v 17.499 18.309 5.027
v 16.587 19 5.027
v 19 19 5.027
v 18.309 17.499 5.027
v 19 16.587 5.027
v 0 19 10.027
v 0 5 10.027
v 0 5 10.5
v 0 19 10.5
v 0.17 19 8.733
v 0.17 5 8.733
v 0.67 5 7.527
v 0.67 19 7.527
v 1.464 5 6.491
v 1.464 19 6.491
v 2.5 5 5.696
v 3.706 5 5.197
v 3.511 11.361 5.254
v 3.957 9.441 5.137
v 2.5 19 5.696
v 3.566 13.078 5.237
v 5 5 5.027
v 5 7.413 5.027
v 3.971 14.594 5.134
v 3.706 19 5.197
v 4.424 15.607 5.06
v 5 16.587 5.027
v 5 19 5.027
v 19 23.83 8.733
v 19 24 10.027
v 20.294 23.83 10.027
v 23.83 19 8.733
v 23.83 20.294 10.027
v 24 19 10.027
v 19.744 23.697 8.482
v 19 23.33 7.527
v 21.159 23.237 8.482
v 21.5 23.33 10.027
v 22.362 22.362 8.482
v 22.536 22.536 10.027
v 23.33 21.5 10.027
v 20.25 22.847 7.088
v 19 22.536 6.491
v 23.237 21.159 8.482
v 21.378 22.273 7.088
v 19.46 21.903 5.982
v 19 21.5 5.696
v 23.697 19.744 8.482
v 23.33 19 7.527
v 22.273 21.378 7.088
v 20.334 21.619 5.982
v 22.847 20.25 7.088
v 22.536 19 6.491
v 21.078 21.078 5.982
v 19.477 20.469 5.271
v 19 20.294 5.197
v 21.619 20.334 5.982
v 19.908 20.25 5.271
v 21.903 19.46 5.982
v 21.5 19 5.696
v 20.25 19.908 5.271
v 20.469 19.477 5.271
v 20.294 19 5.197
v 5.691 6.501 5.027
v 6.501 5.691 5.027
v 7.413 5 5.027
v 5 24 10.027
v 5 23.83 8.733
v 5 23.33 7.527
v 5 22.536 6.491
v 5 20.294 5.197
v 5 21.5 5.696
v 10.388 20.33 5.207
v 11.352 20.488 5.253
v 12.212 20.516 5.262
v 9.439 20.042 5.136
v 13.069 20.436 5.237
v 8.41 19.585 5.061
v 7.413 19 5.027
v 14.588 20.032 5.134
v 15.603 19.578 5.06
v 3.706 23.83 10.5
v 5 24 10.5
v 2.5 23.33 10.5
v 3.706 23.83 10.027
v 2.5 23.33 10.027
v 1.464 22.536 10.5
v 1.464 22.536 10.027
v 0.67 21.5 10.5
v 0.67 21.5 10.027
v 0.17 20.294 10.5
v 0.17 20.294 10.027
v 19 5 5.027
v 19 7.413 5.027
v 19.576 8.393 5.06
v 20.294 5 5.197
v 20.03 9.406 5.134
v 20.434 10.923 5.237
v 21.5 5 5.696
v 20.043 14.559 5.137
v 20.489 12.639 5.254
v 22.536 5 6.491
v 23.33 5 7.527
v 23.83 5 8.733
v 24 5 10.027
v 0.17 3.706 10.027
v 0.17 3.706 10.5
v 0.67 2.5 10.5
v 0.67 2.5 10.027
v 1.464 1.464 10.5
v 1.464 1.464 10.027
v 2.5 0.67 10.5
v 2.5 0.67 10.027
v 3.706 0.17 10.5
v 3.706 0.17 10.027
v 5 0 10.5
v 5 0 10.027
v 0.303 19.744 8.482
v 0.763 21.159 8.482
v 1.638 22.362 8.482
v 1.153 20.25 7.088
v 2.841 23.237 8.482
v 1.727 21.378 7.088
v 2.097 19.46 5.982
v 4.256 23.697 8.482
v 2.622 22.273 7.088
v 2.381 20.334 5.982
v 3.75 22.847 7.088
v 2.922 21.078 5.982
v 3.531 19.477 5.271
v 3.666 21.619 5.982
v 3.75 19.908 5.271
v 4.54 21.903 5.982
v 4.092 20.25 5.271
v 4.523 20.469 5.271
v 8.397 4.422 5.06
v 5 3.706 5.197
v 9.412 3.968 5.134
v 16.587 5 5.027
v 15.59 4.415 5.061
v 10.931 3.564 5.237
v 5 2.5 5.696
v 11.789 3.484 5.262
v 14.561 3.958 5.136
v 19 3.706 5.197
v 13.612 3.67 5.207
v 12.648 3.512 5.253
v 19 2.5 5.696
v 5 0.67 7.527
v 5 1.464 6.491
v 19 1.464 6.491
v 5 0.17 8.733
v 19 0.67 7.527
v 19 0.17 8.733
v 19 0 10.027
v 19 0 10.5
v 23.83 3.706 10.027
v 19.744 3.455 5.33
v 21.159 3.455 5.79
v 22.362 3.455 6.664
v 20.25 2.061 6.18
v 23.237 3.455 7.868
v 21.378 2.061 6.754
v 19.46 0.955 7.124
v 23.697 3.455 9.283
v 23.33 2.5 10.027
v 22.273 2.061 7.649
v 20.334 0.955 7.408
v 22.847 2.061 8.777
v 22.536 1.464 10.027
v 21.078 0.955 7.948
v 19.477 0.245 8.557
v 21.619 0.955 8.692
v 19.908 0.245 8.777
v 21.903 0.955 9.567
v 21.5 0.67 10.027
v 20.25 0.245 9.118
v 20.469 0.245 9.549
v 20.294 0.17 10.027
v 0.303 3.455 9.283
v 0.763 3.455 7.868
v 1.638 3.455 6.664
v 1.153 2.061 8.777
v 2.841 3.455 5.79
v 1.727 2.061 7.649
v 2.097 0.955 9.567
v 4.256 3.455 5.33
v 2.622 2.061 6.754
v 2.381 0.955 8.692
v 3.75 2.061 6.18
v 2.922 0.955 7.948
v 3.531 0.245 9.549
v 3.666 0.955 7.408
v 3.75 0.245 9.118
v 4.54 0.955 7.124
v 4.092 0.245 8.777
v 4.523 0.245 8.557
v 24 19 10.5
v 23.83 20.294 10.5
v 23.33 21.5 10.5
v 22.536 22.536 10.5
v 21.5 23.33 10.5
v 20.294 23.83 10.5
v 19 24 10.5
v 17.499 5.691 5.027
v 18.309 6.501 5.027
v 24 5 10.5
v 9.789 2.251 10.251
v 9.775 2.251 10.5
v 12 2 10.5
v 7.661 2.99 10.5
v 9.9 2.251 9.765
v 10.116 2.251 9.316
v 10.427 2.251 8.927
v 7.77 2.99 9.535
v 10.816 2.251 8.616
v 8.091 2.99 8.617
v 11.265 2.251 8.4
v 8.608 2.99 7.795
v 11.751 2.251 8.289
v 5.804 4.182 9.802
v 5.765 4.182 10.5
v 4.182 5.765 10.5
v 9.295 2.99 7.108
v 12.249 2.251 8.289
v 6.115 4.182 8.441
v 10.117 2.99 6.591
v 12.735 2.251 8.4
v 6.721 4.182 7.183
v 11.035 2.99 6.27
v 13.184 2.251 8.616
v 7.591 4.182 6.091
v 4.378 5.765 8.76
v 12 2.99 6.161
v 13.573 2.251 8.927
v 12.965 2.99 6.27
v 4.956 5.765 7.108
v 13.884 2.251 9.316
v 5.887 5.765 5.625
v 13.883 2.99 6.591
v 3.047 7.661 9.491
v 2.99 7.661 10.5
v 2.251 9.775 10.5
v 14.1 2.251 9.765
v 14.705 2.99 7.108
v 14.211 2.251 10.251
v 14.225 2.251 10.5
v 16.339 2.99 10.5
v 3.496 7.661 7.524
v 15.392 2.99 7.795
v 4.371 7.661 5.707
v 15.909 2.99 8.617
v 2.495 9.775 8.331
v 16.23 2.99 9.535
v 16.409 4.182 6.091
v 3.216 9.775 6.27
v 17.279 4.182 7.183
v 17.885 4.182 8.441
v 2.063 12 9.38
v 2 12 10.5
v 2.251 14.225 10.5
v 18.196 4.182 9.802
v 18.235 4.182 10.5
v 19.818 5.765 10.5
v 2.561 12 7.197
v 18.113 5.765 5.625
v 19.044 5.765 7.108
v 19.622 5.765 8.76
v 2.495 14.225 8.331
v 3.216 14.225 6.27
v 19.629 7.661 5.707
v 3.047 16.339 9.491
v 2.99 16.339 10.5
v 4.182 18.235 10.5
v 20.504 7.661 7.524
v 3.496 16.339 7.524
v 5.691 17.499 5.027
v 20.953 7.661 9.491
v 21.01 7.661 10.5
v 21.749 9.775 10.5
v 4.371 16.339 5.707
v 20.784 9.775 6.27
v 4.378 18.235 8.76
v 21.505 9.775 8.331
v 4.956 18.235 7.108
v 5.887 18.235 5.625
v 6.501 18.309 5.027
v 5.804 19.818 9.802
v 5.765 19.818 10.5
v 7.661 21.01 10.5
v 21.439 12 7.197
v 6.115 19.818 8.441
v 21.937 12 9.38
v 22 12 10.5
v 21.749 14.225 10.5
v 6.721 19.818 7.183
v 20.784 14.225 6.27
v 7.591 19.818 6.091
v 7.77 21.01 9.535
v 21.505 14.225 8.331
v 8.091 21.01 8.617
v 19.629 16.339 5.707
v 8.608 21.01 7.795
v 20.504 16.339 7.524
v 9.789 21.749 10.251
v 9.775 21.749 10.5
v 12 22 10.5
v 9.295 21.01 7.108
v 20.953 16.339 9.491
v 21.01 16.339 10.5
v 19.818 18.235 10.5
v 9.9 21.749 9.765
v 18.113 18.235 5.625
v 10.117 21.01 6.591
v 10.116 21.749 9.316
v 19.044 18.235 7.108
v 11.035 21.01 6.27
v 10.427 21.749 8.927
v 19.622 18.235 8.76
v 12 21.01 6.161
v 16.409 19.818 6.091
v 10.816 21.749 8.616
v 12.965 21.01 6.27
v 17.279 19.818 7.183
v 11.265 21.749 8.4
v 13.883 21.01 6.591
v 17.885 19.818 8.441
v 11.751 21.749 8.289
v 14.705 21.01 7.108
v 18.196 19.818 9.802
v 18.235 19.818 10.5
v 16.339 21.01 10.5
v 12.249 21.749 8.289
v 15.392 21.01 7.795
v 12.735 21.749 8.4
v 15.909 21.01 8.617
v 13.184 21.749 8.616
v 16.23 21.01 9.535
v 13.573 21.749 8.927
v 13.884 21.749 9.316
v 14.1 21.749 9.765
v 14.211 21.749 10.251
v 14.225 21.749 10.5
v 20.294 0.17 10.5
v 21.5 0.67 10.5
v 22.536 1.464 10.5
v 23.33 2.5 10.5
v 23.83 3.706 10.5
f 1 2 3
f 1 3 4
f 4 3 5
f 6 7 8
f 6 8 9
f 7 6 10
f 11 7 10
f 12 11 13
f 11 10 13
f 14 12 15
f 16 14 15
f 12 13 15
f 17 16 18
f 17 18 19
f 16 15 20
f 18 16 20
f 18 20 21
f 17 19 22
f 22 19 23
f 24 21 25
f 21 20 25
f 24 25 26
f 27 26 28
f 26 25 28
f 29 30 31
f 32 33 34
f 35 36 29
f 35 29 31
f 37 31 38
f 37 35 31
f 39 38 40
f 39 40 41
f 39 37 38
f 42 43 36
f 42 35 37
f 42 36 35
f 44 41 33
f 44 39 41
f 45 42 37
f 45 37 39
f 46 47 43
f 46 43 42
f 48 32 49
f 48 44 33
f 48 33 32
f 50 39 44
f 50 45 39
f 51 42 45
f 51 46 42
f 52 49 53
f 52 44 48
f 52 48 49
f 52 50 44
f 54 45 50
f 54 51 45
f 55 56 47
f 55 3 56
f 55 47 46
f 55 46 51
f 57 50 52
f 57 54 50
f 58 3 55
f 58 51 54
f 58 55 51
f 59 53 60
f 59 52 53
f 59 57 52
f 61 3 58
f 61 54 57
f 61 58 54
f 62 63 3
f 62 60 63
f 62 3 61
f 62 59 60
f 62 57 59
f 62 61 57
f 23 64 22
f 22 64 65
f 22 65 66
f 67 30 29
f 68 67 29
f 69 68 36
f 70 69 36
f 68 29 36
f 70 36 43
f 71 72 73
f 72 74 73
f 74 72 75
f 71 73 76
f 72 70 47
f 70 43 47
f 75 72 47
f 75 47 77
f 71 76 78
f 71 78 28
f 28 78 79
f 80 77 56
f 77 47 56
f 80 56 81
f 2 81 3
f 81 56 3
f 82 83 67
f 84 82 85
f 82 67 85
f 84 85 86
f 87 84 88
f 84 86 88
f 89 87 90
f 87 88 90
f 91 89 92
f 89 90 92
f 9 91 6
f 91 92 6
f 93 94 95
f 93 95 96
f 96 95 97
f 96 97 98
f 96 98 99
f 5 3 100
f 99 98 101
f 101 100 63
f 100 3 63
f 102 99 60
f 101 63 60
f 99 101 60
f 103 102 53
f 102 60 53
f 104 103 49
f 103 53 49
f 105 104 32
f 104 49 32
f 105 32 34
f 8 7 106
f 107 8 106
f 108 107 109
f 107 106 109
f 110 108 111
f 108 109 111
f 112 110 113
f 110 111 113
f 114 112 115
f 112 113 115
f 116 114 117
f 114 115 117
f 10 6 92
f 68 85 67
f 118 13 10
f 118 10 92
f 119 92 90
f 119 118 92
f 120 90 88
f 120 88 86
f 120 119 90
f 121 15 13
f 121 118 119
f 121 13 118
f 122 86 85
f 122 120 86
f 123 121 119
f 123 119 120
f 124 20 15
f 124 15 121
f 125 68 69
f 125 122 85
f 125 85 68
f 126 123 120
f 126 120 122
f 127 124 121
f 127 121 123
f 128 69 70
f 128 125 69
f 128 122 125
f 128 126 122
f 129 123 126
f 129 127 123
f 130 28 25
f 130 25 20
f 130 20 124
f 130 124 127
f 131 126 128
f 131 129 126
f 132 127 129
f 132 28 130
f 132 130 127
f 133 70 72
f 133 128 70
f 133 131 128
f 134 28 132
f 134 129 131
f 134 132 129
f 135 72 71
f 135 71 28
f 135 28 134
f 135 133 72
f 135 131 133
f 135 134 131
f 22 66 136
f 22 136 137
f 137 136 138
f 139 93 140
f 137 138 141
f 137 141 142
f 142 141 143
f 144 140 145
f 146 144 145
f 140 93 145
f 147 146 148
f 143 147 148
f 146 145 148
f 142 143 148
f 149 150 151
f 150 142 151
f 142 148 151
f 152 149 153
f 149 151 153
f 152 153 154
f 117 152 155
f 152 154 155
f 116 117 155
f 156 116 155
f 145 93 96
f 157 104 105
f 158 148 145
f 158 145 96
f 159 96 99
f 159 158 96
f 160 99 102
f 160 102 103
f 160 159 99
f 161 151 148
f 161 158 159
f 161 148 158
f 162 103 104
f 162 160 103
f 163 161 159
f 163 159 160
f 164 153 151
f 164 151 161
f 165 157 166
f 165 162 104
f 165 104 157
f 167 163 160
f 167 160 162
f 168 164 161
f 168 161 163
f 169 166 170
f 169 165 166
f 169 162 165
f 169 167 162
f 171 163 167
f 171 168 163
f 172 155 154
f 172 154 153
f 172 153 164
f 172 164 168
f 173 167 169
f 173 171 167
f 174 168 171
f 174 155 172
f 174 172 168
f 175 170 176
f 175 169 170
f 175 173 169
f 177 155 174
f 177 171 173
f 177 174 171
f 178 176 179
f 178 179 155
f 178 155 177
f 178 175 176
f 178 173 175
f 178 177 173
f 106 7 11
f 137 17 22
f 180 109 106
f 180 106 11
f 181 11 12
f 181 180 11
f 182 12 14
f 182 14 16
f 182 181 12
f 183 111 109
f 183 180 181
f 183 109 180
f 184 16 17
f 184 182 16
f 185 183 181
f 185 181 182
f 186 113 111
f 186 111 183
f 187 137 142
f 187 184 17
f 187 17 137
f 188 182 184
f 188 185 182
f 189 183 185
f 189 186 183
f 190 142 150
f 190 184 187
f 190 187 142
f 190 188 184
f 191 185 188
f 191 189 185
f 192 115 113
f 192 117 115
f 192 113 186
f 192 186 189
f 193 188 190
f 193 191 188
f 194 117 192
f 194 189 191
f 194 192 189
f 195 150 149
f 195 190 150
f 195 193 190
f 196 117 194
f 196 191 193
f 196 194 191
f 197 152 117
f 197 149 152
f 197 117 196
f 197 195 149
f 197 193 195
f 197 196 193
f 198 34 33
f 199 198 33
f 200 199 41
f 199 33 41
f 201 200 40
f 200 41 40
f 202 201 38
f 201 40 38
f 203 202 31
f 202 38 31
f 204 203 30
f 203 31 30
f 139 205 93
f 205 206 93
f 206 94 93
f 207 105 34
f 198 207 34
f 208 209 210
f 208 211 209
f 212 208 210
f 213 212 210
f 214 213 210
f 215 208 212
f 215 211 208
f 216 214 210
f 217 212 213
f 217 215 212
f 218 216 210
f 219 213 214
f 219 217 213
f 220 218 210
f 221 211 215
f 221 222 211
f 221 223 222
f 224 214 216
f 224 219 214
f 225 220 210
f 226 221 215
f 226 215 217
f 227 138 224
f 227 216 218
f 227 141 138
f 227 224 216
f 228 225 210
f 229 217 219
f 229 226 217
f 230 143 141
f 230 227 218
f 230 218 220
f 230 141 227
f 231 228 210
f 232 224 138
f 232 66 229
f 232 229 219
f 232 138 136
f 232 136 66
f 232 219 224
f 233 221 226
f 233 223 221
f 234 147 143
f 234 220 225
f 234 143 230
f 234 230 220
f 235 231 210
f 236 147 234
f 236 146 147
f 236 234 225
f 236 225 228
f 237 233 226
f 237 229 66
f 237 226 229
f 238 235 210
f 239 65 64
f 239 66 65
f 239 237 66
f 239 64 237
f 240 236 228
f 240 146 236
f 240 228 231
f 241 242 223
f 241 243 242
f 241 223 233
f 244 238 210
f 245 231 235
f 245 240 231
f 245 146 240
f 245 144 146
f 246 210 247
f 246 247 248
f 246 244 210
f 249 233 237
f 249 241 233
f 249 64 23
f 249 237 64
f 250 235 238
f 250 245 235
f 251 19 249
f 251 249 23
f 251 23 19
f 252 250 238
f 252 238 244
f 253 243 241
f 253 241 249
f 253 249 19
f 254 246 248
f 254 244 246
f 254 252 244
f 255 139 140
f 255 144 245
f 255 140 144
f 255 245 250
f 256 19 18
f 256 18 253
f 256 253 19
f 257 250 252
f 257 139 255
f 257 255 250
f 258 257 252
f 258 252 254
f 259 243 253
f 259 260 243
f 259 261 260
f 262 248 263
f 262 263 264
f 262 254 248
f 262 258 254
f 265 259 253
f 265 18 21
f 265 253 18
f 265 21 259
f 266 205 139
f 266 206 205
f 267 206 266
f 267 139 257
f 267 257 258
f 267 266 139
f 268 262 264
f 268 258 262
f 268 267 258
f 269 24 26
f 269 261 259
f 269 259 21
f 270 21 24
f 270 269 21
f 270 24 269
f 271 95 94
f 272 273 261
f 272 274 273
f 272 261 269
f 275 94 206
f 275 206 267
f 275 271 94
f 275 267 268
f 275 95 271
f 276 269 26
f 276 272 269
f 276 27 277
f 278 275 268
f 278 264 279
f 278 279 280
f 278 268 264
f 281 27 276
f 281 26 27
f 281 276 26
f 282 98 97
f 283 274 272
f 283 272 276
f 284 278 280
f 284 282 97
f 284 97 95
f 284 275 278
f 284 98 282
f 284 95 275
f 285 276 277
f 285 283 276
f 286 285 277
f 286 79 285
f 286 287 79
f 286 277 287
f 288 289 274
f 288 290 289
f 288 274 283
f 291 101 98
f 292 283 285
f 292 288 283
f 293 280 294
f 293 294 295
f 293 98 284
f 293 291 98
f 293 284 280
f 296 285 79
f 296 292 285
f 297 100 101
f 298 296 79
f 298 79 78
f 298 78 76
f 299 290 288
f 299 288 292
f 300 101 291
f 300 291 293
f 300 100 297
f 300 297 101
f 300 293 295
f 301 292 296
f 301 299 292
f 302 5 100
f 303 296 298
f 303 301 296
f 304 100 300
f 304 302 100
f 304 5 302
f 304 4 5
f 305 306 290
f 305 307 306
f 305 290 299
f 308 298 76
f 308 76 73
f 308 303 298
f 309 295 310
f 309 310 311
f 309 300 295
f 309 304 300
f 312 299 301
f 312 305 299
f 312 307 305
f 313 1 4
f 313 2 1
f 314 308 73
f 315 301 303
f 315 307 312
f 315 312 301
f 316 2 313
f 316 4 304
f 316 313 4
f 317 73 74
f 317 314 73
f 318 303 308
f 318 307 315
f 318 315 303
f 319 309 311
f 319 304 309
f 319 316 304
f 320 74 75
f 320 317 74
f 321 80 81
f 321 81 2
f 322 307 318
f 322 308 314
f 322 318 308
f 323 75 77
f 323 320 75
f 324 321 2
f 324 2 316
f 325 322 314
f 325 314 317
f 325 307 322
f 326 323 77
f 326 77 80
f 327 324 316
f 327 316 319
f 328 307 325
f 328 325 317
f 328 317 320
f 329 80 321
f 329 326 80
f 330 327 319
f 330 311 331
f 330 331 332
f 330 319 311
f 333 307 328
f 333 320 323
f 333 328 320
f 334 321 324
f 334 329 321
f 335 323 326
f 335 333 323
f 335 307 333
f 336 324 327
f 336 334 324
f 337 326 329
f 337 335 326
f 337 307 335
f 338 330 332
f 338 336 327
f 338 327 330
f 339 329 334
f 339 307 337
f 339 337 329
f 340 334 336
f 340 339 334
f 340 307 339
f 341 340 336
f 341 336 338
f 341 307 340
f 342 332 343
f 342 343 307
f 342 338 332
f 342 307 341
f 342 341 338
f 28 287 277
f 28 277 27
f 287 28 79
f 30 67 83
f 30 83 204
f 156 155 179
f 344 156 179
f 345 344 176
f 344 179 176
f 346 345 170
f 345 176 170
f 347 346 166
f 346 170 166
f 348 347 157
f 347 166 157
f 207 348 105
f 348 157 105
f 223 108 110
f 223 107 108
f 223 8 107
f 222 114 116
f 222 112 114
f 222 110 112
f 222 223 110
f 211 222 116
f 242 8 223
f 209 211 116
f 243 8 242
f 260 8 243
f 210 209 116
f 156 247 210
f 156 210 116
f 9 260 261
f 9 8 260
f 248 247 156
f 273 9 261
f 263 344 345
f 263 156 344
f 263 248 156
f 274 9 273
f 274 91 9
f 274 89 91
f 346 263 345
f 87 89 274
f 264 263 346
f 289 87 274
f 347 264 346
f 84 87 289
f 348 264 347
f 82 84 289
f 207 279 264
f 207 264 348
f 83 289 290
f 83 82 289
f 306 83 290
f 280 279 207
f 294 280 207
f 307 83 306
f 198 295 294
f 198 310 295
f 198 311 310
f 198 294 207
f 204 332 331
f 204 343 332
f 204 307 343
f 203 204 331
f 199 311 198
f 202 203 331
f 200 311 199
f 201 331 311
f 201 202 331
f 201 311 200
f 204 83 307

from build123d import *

# Parameters (mm, degrees)
SKETCH2_W           = 24
SKETCH2_H           = 24
BOSS_EXTRUDE1_DEPTH = 10.5
CUT_EXTRUDE1_DEPTH  = 36.528157847
FILLET1_R           = 5


with BuildPart() as part:
    # Sketch2 → Boss-Extrude1 (new body)
    with BuildSketch(Plane.XY):
        with Locations((12, 12)):
            Rectangle(SKETCH2_W, SKETCH2_H)
    extrude(amount=BOSS_EXTRUDE1_DEPTH)

    # Sketch4 → Cut-Revolve1 (revolve, cut)
    with BuildSketch(Plane.XY.offset(10.5)):
        with BuildLine():
            Line((12, 22), (12, 2))
            ThreePointArc((12, 2), (2, 12), (12, 22))
        make_face()
    revolve(axis=Axis((12, 22, 10.5), (0, -1, 0)), mode=Mode.SUBTRACT)

    # Sketch6 → Cut-Extrude1 (cut, through all)
    with BuildSketch(Plane(origin=(24, 0, 0), x_dir=(0, 0, -1), z_dir=(1, 0, 0))):
        Polygon((0, 24), (-3.026616613, 24), (-5.026616613, 24), (-5.026616613, 0), (-3.026616613, 0), (0, 0), align=None)
    extrude(amount=-CUT_EXTRUDE1_DEPTH, mode=Mode.SUBTRACT)

    # Fillet1
    # the kernel refuses this fillet: 5 mm, written as the material it takes off along each edge
    with BuildSketch(Plane(origin=(5, 19, 10.026616613), x_dir=(-1, 0, 0), z_dir=(0, 0, -1))) as fillet1_piece_1_section:
        Polygon((0, 0), (FILLET1_R, 0), (FILLET1_R, FILLET1_R), (0, FILLET1_R), align=None)
    fillet1_piece_1 = extrude(amount=FILLET1_R, mode=Mode.PRIVATE)
    fillet1_piece_1 = fillet1_piece_1 - Plane(origin=(5, 19, 10.026616613), x_dir=(0.7071067811865475, -0.7071067811865475, 0), z_dir=(0, 0, -1)) * Sphere(FILLET1_R, mode=Mode.PRIVATE)
    add(fillet1_piece_1, mode=Mode.SUBTRACT)
    with BuildSketch(Plane(origin=(5, 5, 10.026616613), x_dir=(0, 0, -1), z_dir=(0, -1, 0))) as fillet1_piece_2_section:
        Polygon((0, 0), (FILLET1_R, 0), (FILLET1_R, -FILLET1_R), (0, -FILLET1_R), align=None)
    fillet1_piece_2 = extrude(amount=FILLET1_R, mode=Mode.PRIVATE)
    fillet1_piece_2 = fillet1_piece_2 - Plane(origin=(5, 5, 10.026616613), x_dir=(0.7071067811865475, 0, 0.7071067811865475), z_dir=(0, -1, 0)) * Sphere(FILLET1_R, mode=Mode.PRIVATE)
    add(fillet1_piece_2, mode=Mode.SUBTRACT)
    with BuildSketch(Plane(origin=(19, 5, 10.026616613), x_dir=(0, 0, -1), z_dir=(0, -1, 0))) as fillet1_piece_3_section:
        Polygon((0, 0), (FILLET1_R, 0), (FILLET1_R, FILLET1_R), (0, FILLET1_R), align=None)
    fillet1_piece_3 = extrude(amount=FILLET1_R, mode=Mode.PRIVATE)
    fillet1_piece_3 = fillet1_piece_3 - Plane(origin=(19, 5, 10.026616613), x_dir=(-0.7071067811865475, 0, 0.7071067811865475), z_dir=(0, -1, 0)) * Sphere(FILLET1_R, mode=Mode.PRIVATE)
    add(fillet1_piece_3, mode=Mode.SUBTRACT)
    with BuildSketch(Plane(origin=(19, 19, 10.026616613), x_dir=(1, 0, 0), z_dir=(0, 0, -1))) as fillet1_piece_4_section:
        Polygon((0, 0), (FILLET1_R, 0), (FILLET1_R, -FILLET1_R), (0, -FILLET1_R), align=None)
    fillet1_piece_4 = extrude(amount=FILLET1_R, mode=Mode.PRIVATE)
    fillet1_piece_4 = fillet1_piece_4 - Plane(origin=(19, 19, 10.026616613), x_dir=(-0.7071067811865475, -0.7071067811865475, 0), z_dir=(0, 0, -1)) * Sphere(FILLET1_R, mode=Mode.PRIVATE)
    add(fillet1_piece_4, mode=Mode.SUBTRACT)
    with BuildSketch(Plane(origin=(0, 19, 5.026616613), x_dir=(1, 0, 0), z_dir=(0, -1, 0)), Plane(origin=(19, 0, 5.026616613), x_dir=(0, 0, 1), z_dir=(-1, 0, 0)), Plane(origin=(19, 24, 5.026616613), x_dir=(0, -1, 0), z_dir=(-1, 0, 0))) as fillet1_piece_5:
        with BuildLine():
            CenterArc((FILLET1_R, FILLET1_R), FILLET1_R, 180, 90)
            Line((0, FILLET1_R), (0, 0))
            Line((0, 0), (FILLET1_R, 0))
        make_face()
    extrude(amount=14, mode=Mode.SUBTRACT)
    with BuildSketch(Plane(origin=(24, 19, 5.026616613), x_dir=(-1, 0, 0), z_dir=(0, -1, 0))) as fillet1_piece_6:
        with BuildLine():
            CenterArc((FILLET1_R, -FILLET1_R), FILLET1_R, 90, 90)
            Line((0, -FILLET1_R), (0, 0))
            Line((0, 0), (FILLET1_R, 0))
        make_face()
    extrude(amount=14, mode=Mode.SUBTRACT)
    with BuildSketch(Plane(origin=(0, 24, 10.026616613), x_dir=(0, -1, 0), z_dir=(0, 0, 1)), Plane(origin=(0, 0, 10.026616613), x_dir=(1, 0, 0), z_dir=(0, 0, 1))) as fillet1_piece_7:
        with BuildLine():
            CenterArc((FILLET1_R, FILLET1_R), FILLET1_R, 180, 90)
            Line((0, FILLET1_R), (0, 0))
            Line((0, 0), (FILLET1_R, 0))
        make_face()
    extrude(amount=12.973383387, mode=Mode.SUBTRACT)
    with BuildSketch(Plane(origin=(24, 24, 10.026616613), x_dir=(0, -1, 0), z_dir=(0, 0, 1)), Plane(origin=(24, 0, 10.026616613), x_dir=(-1, 0, 0), z_dir=(0, 0, 1))) as fillet1_piece_8:
        with BuildLine():
            CenterArc((FILLET1_R, -FILLET1_R), FILLET1_R, 90, 90)
            Line((0, -FILLET1_R), (0, 0))
            Line((0, 0), (FILLET1_R, 0))
        make_face()
    extrude(amount=12.973383387, mode=Mode.SUBTRACT)


solid = part.part
